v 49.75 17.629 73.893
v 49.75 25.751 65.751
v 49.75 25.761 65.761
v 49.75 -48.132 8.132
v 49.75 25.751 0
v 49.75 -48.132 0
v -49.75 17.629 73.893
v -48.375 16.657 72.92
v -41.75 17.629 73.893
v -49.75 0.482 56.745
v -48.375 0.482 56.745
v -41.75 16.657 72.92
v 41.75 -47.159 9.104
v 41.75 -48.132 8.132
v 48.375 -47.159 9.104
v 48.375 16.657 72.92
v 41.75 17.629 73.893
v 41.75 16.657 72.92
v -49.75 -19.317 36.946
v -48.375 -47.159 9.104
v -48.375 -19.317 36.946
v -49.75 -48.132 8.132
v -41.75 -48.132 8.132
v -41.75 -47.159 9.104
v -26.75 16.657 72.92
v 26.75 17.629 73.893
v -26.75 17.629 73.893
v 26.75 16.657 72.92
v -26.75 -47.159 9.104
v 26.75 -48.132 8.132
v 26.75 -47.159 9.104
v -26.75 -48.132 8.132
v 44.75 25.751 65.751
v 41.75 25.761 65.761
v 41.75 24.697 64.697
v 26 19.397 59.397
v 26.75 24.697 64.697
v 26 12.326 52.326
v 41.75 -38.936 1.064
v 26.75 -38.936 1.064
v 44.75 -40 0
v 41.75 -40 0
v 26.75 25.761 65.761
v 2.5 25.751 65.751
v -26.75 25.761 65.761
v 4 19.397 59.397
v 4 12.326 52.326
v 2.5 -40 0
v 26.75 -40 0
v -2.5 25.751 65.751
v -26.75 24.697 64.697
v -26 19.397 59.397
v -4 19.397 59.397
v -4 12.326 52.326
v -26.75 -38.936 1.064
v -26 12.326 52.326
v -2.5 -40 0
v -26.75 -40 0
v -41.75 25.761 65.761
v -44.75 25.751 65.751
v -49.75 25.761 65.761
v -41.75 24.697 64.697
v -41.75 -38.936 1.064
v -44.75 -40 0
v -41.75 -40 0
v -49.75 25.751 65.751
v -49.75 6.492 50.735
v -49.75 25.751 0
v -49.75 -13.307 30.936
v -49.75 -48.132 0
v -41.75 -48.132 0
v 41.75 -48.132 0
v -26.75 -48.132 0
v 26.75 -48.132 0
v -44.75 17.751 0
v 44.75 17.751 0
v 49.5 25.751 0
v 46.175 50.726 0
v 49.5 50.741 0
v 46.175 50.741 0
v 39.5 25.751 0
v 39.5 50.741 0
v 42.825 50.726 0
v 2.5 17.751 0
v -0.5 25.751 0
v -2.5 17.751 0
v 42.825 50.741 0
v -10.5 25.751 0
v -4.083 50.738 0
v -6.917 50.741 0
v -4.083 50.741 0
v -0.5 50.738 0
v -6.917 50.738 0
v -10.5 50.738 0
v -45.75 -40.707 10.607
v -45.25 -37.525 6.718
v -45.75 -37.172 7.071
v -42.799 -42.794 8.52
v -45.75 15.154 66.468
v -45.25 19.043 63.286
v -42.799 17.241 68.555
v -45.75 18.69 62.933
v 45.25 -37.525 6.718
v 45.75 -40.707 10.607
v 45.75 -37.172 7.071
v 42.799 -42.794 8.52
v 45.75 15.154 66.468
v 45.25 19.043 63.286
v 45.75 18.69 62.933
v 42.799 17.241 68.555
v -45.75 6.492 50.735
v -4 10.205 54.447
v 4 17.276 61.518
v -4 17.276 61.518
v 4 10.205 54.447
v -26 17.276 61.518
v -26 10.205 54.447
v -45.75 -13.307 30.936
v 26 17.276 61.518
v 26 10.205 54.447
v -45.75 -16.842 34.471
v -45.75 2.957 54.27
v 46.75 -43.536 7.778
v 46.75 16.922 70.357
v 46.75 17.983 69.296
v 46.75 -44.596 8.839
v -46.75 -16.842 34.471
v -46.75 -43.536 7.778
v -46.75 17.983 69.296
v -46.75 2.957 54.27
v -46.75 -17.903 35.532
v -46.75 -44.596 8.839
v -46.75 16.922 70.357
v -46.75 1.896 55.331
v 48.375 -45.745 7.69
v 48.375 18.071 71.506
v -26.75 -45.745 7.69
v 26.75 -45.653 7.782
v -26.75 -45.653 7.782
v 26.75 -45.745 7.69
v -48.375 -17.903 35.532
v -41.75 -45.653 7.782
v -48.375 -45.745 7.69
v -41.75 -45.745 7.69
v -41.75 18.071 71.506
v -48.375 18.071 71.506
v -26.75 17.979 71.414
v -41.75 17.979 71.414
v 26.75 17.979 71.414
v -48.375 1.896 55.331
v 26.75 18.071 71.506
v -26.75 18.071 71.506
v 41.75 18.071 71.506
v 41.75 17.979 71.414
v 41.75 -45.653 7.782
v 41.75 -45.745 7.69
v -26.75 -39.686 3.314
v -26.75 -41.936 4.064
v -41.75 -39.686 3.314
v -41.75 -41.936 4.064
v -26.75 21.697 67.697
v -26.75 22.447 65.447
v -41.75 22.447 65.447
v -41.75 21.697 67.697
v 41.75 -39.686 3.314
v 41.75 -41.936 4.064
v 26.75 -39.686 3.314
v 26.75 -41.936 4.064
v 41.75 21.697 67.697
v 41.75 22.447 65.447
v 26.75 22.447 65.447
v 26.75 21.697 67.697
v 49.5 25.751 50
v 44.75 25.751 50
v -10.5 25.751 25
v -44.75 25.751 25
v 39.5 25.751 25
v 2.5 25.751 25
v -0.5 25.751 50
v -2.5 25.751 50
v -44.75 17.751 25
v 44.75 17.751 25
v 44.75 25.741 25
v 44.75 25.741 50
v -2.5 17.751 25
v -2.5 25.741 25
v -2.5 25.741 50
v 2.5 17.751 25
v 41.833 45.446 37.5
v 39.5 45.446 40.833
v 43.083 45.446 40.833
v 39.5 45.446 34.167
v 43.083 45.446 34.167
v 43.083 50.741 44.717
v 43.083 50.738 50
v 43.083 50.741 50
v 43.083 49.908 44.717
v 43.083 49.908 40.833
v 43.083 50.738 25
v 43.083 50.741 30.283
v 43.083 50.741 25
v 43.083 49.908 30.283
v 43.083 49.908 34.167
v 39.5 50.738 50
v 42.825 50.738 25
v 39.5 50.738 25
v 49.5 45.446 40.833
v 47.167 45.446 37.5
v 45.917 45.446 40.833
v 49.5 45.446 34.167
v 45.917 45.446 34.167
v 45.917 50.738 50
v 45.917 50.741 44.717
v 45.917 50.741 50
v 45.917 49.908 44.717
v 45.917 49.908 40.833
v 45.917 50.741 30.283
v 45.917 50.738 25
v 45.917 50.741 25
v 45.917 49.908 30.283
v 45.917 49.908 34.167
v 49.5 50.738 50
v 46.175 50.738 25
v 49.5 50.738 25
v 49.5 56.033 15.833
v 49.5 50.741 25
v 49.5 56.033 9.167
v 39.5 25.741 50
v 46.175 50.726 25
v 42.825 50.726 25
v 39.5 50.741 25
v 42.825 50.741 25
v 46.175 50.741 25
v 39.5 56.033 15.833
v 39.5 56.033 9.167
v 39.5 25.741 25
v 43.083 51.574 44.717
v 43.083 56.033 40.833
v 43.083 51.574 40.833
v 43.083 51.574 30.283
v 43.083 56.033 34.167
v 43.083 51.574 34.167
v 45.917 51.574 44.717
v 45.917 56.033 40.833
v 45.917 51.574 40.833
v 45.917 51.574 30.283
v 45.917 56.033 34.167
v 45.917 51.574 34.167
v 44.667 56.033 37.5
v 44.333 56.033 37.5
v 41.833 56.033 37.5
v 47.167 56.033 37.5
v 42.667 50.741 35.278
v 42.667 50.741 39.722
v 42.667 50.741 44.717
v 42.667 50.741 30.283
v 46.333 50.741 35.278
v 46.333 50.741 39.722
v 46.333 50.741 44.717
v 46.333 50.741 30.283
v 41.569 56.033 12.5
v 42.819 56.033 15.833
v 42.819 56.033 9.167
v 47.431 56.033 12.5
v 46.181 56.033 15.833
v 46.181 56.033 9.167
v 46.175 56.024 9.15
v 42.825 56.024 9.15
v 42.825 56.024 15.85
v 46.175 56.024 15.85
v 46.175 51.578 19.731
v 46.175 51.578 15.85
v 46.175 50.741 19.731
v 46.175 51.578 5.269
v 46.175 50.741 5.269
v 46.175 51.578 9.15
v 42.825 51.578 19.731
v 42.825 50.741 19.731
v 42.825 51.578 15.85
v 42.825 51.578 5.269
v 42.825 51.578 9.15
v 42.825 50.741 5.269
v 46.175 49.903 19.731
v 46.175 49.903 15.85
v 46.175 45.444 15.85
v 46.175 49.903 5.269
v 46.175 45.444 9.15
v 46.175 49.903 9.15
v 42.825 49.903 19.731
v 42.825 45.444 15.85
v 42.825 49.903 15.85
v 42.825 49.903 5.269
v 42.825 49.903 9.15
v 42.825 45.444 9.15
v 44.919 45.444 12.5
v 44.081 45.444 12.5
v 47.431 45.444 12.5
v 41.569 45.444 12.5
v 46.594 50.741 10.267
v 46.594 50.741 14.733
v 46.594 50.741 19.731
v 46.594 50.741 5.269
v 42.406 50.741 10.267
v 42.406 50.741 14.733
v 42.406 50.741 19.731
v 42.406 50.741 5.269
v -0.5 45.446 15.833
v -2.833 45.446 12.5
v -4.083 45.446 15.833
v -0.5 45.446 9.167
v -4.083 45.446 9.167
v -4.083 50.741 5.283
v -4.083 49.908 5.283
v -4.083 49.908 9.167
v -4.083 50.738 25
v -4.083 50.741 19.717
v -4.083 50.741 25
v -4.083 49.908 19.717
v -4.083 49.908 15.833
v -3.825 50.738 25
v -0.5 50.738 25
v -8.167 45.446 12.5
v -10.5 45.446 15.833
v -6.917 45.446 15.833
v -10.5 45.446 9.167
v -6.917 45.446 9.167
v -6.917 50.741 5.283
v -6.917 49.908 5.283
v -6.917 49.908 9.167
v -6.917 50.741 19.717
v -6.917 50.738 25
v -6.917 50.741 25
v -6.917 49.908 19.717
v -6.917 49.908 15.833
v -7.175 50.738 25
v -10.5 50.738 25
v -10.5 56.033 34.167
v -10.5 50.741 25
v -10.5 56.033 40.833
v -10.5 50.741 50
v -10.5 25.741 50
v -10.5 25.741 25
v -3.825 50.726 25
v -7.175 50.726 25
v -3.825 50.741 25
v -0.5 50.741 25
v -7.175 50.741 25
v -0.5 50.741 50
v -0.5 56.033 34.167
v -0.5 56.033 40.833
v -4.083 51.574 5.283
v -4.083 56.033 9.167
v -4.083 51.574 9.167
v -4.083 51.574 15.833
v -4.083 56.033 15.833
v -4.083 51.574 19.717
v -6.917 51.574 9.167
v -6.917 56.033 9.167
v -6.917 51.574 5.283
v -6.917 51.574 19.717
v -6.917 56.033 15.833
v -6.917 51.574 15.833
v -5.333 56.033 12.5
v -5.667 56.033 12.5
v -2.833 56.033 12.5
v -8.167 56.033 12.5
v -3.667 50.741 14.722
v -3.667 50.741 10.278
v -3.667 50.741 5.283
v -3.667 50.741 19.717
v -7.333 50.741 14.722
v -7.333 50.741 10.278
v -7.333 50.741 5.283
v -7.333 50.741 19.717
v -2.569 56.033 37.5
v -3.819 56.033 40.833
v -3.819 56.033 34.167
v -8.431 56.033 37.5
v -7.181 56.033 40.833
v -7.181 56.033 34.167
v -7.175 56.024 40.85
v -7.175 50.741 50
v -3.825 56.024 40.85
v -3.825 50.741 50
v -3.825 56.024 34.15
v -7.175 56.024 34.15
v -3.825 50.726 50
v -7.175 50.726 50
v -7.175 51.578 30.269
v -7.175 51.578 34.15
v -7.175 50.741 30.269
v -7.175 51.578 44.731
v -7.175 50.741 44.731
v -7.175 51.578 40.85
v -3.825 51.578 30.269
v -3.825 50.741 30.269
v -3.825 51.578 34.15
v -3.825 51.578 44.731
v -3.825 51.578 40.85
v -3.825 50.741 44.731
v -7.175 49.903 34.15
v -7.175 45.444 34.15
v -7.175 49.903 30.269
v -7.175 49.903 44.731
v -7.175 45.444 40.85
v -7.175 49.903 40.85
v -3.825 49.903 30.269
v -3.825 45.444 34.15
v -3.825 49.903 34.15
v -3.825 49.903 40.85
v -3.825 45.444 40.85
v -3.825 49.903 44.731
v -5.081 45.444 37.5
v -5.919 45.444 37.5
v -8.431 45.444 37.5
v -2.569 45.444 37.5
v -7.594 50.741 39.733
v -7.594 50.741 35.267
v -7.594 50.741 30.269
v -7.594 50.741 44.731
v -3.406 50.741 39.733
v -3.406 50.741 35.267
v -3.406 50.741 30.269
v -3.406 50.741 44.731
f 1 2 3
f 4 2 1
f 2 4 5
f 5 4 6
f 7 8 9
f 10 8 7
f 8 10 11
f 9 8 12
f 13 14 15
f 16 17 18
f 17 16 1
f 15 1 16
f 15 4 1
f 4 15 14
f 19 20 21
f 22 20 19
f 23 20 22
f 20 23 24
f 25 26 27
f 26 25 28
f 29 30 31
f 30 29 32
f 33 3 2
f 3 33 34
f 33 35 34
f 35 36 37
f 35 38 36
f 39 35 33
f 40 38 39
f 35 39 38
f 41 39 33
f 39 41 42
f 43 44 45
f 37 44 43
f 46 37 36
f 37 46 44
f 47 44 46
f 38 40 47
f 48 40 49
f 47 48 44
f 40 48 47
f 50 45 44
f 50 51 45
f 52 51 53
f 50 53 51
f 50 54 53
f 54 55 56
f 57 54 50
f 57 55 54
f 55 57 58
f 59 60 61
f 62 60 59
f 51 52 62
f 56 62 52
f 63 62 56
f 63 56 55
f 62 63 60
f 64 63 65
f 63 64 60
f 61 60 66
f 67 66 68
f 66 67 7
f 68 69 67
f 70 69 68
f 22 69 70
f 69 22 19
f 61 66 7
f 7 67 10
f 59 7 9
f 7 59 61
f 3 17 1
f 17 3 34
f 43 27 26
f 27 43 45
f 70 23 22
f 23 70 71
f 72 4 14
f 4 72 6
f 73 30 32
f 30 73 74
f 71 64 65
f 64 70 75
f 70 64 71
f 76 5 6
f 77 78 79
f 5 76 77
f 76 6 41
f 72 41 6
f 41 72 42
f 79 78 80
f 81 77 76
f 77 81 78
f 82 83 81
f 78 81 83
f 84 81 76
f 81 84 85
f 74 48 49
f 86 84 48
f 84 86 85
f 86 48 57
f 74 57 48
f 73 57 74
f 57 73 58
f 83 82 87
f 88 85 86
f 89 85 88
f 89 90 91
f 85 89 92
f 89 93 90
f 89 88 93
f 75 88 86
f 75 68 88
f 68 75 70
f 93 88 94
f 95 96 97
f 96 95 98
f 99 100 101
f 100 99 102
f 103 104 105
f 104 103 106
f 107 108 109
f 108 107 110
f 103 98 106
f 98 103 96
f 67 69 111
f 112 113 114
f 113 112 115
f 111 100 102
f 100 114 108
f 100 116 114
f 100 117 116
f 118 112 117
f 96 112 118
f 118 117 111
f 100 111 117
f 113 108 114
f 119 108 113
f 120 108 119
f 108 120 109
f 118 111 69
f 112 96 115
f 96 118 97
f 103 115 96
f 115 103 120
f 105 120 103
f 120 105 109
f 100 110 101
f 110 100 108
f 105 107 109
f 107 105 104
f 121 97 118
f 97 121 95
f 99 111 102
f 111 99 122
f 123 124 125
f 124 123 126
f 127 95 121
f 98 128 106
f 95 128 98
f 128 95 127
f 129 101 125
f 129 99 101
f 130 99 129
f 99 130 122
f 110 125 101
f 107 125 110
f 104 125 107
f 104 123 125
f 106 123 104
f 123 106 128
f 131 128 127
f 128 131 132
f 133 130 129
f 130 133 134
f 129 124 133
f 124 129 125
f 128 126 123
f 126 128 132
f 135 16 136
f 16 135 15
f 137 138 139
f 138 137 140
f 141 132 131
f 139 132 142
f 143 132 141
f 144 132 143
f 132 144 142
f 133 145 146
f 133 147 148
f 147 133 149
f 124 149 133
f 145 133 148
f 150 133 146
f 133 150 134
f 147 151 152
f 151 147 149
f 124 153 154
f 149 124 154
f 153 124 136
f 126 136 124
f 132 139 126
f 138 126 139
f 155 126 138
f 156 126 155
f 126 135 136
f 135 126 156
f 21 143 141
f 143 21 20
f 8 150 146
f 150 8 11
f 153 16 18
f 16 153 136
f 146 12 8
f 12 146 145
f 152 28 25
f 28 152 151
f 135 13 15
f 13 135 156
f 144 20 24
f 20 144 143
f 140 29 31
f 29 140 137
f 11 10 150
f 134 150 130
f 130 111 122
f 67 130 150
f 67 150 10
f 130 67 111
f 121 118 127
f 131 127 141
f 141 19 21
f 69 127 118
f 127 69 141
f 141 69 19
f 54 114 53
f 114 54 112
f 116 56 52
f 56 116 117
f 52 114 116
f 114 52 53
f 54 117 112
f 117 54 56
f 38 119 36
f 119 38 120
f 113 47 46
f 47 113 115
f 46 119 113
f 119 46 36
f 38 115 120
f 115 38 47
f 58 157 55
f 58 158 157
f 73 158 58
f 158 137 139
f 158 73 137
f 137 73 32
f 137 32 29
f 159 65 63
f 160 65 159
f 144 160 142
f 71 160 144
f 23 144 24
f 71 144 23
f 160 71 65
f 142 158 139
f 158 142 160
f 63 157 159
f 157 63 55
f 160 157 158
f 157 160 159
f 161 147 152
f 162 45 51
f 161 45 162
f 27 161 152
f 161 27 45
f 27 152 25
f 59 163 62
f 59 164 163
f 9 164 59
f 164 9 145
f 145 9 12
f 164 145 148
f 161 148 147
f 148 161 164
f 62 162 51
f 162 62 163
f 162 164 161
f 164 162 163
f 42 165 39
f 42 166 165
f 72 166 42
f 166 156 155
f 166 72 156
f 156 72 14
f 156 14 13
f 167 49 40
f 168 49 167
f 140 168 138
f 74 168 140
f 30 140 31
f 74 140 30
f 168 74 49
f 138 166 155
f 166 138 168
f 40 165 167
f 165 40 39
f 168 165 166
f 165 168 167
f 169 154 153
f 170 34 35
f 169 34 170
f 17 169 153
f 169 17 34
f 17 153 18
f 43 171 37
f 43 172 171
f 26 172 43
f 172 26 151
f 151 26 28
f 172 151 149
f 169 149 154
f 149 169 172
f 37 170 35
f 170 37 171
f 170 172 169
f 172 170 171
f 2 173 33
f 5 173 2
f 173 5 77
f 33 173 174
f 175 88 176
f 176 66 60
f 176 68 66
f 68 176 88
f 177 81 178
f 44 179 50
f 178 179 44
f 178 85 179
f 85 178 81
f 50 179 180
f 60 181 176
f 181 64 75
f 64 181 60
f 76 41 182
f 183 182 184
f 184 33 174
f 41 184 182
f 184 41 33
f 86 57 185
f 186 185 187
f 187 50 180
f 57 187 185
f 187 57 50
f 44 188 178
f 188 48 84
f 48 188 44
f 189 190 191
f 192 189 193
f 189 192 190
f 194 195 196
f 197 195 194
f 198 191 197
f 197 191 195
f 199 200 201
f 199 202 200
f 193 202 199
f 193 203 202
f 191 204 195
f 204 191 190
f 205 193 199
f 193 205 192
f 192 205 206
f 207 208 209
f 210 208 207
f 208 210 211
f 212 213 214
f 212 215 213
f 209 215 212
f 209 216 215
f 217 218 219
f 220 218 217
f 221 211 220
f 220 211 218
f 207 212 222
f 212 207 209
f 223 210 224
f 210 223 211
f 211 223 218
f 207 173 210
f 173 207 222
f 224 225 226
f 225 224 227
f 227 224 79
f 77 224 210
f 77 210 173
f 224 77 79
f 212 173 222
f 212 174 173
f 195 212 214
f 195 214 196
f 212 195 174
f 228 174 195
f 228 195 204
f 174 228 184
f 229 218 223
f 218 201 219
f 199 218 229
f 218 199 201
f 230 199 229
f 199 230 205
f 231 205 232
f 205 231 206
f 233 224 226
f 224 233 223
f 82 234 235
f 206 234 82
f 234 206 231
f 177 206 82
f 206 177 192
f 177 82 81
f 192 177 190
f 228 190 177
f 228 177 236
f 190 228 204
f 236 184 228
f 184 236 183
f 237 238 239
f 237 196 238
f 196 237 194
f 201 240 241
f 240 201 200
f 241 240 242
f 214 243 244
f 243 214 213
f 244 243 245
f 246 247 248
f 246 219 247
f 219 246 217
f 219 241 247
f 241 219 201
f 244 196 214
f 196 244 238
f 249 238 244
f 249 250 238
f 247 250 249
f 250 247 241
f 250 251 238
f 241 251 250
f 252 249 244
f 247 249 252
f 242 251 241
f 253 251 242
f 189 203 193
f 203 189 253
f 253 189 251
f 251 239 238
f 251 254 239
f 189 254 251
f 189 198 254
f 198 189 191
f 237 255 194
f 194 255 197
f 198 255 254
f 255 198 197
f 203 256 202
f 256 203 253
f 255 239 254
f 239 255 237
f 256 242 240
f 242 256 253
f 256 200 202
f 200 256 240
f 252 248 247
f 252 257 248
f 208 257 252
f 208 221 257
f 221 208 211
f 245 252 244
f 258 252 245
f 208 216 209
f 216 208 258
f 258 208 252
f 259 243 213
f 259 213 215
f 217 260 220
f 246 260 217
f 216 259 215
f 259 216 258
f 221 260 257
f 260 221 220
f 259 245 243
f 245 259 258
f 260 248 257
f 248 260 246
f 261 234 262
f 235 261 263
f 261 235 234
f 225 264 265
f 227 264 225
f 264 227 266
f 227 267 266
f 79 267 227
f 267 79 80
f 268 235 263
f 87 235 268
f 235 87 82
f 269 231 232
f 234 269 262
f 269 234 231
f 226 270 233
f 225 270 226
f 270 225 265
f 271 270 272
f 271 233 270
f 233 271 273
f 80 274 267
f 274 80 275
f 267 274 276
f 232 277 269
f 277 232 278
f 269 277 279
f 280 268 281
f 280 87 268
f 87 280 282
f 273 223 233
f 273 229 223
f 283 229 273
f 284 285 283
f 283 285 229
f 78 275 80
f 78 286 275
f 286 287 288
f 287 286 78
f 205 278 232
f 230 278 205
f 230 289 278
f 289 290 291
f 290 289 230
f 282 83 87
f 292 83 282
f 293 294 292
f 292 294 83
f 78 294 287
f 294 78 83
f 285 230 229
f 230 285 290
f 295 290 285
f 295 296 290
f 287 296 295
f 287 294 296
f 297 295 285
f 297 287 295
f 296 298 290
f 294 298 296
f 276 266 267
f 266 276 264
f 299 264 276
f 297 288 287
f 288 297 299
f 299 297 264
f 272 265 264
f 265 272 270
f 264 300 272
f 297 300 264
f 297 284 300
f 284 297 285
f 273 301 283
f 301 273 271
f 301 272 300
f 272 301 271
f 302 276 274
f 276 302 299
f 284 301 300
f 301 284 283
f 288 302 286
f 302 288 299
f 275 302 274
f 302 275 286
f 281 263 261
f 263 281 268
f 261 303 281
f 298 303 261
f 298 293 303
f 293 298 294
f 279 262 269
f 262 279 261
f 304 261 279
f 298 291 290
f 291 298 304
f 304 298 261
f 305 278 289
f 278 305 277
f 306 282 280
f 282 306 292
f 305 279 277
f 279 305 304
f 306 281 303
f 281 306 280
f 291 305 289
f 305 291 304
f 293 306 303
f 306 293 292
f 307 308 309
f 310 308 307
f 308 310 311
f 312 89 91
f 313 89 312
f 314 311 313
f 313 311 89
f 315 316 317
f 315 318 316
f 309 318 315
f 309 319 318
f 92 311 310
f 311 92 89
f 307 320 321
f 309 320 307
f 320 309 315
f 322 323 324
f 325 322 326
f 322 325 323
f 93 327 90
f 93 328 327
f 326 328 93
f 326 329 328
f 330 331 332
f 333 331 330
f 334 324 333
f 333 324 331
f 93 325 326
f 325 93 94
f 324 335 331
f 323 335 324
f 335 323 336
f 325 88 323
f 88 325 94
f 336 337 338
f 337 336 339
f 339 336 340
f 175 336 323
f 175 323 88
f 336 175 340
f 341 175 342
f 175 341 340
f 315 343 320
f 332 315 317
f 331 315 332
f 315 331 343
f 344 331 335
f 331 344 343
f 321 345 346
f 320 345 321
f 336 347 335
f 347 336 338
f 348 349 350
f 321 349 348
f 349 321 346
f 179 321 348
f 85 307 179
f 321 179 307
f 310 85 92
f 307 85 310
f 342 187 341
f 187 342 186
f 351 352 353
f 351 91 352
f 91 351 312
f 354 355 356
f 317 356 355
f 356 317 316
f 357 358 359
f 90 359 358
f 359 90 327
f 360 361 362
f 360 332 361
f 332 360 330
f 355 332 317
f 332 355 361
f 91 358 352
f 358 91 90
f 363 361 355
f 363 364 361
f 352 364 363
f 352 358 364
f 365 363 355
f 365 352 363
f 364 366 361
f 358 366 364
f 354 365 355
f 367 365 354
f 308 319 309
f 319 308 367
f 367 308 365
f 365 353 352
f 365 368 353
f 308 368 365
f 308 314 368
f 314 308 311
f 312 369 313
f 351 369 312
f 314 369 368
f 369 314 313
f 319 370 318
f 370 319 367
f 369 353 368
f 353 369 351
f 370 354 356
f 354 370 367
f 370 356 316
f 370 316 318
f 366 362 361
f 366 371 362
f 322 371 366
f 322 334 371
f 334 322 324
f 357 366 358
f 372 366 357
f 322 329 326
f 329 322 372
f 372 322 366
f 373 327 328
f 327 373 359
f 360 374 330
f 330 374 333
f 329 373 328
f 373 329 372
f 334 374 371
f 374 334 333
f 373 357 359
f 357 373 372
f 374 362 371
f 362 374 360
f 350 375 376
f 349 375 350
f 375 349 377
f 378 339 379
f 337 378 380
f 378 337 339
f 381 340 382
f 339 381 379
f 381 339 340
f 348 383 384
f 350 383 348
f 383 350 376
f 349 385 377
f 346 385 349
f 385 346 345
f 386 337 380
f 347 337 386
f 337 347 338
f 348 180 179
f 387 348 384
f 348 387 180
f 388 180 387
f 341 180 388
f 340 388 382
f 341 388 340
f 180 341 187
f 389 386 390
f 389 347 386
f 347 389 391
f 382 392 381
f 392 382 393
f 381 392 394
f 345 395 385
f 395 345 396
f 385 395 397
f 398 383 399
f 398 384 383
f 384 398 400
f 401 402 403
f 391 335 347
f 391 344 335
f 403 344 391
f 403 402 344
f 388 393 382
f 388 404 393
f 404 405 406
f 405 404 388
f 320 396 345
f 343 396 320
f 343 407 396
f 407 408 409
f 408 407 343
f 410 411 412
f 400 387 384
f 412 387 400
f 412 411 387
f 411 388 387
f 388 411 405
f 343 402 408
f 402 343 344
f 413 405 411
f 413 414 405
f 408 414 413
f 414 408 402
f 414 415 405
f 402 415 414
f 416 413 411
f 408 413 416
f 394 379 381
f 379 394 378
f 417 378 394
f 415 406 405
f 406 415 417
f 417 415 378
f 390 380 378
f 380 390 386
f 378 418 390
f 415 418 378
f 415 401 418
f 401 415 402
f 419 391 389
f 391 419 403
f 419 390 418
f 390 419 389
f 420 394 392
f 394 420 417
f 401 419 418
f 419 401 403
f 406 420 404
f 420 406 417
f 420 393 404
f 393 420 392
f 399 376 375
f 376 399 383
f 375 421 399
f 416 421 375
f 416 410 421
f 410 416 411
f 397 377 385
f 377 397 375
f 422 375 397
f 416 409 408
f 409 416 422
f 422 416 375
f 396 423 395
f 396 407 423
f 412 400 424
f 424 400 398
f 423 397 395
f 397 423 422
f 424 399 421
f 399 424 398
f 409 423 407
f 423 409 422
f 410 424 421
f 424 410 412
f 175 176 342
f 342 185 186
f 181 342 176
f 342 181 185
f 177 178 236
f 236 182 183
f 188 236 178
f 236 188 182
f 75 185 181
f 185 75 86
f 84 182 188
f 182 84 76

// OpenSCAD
include <config.scad>
use <GDMUtils.scad>
use <joiners.scad>
use <rrd_graphic_lcd_case.scad>


module rrd_graphic_lcd_cover_parts() { // make me
	rrd_graphic_lcd_case_bottom();
}


rrd_graphic_lcd_base_parts();


// vim: noexpandtab tabstop=4 shiftwidth=4 softtabstop=4 nowrap
